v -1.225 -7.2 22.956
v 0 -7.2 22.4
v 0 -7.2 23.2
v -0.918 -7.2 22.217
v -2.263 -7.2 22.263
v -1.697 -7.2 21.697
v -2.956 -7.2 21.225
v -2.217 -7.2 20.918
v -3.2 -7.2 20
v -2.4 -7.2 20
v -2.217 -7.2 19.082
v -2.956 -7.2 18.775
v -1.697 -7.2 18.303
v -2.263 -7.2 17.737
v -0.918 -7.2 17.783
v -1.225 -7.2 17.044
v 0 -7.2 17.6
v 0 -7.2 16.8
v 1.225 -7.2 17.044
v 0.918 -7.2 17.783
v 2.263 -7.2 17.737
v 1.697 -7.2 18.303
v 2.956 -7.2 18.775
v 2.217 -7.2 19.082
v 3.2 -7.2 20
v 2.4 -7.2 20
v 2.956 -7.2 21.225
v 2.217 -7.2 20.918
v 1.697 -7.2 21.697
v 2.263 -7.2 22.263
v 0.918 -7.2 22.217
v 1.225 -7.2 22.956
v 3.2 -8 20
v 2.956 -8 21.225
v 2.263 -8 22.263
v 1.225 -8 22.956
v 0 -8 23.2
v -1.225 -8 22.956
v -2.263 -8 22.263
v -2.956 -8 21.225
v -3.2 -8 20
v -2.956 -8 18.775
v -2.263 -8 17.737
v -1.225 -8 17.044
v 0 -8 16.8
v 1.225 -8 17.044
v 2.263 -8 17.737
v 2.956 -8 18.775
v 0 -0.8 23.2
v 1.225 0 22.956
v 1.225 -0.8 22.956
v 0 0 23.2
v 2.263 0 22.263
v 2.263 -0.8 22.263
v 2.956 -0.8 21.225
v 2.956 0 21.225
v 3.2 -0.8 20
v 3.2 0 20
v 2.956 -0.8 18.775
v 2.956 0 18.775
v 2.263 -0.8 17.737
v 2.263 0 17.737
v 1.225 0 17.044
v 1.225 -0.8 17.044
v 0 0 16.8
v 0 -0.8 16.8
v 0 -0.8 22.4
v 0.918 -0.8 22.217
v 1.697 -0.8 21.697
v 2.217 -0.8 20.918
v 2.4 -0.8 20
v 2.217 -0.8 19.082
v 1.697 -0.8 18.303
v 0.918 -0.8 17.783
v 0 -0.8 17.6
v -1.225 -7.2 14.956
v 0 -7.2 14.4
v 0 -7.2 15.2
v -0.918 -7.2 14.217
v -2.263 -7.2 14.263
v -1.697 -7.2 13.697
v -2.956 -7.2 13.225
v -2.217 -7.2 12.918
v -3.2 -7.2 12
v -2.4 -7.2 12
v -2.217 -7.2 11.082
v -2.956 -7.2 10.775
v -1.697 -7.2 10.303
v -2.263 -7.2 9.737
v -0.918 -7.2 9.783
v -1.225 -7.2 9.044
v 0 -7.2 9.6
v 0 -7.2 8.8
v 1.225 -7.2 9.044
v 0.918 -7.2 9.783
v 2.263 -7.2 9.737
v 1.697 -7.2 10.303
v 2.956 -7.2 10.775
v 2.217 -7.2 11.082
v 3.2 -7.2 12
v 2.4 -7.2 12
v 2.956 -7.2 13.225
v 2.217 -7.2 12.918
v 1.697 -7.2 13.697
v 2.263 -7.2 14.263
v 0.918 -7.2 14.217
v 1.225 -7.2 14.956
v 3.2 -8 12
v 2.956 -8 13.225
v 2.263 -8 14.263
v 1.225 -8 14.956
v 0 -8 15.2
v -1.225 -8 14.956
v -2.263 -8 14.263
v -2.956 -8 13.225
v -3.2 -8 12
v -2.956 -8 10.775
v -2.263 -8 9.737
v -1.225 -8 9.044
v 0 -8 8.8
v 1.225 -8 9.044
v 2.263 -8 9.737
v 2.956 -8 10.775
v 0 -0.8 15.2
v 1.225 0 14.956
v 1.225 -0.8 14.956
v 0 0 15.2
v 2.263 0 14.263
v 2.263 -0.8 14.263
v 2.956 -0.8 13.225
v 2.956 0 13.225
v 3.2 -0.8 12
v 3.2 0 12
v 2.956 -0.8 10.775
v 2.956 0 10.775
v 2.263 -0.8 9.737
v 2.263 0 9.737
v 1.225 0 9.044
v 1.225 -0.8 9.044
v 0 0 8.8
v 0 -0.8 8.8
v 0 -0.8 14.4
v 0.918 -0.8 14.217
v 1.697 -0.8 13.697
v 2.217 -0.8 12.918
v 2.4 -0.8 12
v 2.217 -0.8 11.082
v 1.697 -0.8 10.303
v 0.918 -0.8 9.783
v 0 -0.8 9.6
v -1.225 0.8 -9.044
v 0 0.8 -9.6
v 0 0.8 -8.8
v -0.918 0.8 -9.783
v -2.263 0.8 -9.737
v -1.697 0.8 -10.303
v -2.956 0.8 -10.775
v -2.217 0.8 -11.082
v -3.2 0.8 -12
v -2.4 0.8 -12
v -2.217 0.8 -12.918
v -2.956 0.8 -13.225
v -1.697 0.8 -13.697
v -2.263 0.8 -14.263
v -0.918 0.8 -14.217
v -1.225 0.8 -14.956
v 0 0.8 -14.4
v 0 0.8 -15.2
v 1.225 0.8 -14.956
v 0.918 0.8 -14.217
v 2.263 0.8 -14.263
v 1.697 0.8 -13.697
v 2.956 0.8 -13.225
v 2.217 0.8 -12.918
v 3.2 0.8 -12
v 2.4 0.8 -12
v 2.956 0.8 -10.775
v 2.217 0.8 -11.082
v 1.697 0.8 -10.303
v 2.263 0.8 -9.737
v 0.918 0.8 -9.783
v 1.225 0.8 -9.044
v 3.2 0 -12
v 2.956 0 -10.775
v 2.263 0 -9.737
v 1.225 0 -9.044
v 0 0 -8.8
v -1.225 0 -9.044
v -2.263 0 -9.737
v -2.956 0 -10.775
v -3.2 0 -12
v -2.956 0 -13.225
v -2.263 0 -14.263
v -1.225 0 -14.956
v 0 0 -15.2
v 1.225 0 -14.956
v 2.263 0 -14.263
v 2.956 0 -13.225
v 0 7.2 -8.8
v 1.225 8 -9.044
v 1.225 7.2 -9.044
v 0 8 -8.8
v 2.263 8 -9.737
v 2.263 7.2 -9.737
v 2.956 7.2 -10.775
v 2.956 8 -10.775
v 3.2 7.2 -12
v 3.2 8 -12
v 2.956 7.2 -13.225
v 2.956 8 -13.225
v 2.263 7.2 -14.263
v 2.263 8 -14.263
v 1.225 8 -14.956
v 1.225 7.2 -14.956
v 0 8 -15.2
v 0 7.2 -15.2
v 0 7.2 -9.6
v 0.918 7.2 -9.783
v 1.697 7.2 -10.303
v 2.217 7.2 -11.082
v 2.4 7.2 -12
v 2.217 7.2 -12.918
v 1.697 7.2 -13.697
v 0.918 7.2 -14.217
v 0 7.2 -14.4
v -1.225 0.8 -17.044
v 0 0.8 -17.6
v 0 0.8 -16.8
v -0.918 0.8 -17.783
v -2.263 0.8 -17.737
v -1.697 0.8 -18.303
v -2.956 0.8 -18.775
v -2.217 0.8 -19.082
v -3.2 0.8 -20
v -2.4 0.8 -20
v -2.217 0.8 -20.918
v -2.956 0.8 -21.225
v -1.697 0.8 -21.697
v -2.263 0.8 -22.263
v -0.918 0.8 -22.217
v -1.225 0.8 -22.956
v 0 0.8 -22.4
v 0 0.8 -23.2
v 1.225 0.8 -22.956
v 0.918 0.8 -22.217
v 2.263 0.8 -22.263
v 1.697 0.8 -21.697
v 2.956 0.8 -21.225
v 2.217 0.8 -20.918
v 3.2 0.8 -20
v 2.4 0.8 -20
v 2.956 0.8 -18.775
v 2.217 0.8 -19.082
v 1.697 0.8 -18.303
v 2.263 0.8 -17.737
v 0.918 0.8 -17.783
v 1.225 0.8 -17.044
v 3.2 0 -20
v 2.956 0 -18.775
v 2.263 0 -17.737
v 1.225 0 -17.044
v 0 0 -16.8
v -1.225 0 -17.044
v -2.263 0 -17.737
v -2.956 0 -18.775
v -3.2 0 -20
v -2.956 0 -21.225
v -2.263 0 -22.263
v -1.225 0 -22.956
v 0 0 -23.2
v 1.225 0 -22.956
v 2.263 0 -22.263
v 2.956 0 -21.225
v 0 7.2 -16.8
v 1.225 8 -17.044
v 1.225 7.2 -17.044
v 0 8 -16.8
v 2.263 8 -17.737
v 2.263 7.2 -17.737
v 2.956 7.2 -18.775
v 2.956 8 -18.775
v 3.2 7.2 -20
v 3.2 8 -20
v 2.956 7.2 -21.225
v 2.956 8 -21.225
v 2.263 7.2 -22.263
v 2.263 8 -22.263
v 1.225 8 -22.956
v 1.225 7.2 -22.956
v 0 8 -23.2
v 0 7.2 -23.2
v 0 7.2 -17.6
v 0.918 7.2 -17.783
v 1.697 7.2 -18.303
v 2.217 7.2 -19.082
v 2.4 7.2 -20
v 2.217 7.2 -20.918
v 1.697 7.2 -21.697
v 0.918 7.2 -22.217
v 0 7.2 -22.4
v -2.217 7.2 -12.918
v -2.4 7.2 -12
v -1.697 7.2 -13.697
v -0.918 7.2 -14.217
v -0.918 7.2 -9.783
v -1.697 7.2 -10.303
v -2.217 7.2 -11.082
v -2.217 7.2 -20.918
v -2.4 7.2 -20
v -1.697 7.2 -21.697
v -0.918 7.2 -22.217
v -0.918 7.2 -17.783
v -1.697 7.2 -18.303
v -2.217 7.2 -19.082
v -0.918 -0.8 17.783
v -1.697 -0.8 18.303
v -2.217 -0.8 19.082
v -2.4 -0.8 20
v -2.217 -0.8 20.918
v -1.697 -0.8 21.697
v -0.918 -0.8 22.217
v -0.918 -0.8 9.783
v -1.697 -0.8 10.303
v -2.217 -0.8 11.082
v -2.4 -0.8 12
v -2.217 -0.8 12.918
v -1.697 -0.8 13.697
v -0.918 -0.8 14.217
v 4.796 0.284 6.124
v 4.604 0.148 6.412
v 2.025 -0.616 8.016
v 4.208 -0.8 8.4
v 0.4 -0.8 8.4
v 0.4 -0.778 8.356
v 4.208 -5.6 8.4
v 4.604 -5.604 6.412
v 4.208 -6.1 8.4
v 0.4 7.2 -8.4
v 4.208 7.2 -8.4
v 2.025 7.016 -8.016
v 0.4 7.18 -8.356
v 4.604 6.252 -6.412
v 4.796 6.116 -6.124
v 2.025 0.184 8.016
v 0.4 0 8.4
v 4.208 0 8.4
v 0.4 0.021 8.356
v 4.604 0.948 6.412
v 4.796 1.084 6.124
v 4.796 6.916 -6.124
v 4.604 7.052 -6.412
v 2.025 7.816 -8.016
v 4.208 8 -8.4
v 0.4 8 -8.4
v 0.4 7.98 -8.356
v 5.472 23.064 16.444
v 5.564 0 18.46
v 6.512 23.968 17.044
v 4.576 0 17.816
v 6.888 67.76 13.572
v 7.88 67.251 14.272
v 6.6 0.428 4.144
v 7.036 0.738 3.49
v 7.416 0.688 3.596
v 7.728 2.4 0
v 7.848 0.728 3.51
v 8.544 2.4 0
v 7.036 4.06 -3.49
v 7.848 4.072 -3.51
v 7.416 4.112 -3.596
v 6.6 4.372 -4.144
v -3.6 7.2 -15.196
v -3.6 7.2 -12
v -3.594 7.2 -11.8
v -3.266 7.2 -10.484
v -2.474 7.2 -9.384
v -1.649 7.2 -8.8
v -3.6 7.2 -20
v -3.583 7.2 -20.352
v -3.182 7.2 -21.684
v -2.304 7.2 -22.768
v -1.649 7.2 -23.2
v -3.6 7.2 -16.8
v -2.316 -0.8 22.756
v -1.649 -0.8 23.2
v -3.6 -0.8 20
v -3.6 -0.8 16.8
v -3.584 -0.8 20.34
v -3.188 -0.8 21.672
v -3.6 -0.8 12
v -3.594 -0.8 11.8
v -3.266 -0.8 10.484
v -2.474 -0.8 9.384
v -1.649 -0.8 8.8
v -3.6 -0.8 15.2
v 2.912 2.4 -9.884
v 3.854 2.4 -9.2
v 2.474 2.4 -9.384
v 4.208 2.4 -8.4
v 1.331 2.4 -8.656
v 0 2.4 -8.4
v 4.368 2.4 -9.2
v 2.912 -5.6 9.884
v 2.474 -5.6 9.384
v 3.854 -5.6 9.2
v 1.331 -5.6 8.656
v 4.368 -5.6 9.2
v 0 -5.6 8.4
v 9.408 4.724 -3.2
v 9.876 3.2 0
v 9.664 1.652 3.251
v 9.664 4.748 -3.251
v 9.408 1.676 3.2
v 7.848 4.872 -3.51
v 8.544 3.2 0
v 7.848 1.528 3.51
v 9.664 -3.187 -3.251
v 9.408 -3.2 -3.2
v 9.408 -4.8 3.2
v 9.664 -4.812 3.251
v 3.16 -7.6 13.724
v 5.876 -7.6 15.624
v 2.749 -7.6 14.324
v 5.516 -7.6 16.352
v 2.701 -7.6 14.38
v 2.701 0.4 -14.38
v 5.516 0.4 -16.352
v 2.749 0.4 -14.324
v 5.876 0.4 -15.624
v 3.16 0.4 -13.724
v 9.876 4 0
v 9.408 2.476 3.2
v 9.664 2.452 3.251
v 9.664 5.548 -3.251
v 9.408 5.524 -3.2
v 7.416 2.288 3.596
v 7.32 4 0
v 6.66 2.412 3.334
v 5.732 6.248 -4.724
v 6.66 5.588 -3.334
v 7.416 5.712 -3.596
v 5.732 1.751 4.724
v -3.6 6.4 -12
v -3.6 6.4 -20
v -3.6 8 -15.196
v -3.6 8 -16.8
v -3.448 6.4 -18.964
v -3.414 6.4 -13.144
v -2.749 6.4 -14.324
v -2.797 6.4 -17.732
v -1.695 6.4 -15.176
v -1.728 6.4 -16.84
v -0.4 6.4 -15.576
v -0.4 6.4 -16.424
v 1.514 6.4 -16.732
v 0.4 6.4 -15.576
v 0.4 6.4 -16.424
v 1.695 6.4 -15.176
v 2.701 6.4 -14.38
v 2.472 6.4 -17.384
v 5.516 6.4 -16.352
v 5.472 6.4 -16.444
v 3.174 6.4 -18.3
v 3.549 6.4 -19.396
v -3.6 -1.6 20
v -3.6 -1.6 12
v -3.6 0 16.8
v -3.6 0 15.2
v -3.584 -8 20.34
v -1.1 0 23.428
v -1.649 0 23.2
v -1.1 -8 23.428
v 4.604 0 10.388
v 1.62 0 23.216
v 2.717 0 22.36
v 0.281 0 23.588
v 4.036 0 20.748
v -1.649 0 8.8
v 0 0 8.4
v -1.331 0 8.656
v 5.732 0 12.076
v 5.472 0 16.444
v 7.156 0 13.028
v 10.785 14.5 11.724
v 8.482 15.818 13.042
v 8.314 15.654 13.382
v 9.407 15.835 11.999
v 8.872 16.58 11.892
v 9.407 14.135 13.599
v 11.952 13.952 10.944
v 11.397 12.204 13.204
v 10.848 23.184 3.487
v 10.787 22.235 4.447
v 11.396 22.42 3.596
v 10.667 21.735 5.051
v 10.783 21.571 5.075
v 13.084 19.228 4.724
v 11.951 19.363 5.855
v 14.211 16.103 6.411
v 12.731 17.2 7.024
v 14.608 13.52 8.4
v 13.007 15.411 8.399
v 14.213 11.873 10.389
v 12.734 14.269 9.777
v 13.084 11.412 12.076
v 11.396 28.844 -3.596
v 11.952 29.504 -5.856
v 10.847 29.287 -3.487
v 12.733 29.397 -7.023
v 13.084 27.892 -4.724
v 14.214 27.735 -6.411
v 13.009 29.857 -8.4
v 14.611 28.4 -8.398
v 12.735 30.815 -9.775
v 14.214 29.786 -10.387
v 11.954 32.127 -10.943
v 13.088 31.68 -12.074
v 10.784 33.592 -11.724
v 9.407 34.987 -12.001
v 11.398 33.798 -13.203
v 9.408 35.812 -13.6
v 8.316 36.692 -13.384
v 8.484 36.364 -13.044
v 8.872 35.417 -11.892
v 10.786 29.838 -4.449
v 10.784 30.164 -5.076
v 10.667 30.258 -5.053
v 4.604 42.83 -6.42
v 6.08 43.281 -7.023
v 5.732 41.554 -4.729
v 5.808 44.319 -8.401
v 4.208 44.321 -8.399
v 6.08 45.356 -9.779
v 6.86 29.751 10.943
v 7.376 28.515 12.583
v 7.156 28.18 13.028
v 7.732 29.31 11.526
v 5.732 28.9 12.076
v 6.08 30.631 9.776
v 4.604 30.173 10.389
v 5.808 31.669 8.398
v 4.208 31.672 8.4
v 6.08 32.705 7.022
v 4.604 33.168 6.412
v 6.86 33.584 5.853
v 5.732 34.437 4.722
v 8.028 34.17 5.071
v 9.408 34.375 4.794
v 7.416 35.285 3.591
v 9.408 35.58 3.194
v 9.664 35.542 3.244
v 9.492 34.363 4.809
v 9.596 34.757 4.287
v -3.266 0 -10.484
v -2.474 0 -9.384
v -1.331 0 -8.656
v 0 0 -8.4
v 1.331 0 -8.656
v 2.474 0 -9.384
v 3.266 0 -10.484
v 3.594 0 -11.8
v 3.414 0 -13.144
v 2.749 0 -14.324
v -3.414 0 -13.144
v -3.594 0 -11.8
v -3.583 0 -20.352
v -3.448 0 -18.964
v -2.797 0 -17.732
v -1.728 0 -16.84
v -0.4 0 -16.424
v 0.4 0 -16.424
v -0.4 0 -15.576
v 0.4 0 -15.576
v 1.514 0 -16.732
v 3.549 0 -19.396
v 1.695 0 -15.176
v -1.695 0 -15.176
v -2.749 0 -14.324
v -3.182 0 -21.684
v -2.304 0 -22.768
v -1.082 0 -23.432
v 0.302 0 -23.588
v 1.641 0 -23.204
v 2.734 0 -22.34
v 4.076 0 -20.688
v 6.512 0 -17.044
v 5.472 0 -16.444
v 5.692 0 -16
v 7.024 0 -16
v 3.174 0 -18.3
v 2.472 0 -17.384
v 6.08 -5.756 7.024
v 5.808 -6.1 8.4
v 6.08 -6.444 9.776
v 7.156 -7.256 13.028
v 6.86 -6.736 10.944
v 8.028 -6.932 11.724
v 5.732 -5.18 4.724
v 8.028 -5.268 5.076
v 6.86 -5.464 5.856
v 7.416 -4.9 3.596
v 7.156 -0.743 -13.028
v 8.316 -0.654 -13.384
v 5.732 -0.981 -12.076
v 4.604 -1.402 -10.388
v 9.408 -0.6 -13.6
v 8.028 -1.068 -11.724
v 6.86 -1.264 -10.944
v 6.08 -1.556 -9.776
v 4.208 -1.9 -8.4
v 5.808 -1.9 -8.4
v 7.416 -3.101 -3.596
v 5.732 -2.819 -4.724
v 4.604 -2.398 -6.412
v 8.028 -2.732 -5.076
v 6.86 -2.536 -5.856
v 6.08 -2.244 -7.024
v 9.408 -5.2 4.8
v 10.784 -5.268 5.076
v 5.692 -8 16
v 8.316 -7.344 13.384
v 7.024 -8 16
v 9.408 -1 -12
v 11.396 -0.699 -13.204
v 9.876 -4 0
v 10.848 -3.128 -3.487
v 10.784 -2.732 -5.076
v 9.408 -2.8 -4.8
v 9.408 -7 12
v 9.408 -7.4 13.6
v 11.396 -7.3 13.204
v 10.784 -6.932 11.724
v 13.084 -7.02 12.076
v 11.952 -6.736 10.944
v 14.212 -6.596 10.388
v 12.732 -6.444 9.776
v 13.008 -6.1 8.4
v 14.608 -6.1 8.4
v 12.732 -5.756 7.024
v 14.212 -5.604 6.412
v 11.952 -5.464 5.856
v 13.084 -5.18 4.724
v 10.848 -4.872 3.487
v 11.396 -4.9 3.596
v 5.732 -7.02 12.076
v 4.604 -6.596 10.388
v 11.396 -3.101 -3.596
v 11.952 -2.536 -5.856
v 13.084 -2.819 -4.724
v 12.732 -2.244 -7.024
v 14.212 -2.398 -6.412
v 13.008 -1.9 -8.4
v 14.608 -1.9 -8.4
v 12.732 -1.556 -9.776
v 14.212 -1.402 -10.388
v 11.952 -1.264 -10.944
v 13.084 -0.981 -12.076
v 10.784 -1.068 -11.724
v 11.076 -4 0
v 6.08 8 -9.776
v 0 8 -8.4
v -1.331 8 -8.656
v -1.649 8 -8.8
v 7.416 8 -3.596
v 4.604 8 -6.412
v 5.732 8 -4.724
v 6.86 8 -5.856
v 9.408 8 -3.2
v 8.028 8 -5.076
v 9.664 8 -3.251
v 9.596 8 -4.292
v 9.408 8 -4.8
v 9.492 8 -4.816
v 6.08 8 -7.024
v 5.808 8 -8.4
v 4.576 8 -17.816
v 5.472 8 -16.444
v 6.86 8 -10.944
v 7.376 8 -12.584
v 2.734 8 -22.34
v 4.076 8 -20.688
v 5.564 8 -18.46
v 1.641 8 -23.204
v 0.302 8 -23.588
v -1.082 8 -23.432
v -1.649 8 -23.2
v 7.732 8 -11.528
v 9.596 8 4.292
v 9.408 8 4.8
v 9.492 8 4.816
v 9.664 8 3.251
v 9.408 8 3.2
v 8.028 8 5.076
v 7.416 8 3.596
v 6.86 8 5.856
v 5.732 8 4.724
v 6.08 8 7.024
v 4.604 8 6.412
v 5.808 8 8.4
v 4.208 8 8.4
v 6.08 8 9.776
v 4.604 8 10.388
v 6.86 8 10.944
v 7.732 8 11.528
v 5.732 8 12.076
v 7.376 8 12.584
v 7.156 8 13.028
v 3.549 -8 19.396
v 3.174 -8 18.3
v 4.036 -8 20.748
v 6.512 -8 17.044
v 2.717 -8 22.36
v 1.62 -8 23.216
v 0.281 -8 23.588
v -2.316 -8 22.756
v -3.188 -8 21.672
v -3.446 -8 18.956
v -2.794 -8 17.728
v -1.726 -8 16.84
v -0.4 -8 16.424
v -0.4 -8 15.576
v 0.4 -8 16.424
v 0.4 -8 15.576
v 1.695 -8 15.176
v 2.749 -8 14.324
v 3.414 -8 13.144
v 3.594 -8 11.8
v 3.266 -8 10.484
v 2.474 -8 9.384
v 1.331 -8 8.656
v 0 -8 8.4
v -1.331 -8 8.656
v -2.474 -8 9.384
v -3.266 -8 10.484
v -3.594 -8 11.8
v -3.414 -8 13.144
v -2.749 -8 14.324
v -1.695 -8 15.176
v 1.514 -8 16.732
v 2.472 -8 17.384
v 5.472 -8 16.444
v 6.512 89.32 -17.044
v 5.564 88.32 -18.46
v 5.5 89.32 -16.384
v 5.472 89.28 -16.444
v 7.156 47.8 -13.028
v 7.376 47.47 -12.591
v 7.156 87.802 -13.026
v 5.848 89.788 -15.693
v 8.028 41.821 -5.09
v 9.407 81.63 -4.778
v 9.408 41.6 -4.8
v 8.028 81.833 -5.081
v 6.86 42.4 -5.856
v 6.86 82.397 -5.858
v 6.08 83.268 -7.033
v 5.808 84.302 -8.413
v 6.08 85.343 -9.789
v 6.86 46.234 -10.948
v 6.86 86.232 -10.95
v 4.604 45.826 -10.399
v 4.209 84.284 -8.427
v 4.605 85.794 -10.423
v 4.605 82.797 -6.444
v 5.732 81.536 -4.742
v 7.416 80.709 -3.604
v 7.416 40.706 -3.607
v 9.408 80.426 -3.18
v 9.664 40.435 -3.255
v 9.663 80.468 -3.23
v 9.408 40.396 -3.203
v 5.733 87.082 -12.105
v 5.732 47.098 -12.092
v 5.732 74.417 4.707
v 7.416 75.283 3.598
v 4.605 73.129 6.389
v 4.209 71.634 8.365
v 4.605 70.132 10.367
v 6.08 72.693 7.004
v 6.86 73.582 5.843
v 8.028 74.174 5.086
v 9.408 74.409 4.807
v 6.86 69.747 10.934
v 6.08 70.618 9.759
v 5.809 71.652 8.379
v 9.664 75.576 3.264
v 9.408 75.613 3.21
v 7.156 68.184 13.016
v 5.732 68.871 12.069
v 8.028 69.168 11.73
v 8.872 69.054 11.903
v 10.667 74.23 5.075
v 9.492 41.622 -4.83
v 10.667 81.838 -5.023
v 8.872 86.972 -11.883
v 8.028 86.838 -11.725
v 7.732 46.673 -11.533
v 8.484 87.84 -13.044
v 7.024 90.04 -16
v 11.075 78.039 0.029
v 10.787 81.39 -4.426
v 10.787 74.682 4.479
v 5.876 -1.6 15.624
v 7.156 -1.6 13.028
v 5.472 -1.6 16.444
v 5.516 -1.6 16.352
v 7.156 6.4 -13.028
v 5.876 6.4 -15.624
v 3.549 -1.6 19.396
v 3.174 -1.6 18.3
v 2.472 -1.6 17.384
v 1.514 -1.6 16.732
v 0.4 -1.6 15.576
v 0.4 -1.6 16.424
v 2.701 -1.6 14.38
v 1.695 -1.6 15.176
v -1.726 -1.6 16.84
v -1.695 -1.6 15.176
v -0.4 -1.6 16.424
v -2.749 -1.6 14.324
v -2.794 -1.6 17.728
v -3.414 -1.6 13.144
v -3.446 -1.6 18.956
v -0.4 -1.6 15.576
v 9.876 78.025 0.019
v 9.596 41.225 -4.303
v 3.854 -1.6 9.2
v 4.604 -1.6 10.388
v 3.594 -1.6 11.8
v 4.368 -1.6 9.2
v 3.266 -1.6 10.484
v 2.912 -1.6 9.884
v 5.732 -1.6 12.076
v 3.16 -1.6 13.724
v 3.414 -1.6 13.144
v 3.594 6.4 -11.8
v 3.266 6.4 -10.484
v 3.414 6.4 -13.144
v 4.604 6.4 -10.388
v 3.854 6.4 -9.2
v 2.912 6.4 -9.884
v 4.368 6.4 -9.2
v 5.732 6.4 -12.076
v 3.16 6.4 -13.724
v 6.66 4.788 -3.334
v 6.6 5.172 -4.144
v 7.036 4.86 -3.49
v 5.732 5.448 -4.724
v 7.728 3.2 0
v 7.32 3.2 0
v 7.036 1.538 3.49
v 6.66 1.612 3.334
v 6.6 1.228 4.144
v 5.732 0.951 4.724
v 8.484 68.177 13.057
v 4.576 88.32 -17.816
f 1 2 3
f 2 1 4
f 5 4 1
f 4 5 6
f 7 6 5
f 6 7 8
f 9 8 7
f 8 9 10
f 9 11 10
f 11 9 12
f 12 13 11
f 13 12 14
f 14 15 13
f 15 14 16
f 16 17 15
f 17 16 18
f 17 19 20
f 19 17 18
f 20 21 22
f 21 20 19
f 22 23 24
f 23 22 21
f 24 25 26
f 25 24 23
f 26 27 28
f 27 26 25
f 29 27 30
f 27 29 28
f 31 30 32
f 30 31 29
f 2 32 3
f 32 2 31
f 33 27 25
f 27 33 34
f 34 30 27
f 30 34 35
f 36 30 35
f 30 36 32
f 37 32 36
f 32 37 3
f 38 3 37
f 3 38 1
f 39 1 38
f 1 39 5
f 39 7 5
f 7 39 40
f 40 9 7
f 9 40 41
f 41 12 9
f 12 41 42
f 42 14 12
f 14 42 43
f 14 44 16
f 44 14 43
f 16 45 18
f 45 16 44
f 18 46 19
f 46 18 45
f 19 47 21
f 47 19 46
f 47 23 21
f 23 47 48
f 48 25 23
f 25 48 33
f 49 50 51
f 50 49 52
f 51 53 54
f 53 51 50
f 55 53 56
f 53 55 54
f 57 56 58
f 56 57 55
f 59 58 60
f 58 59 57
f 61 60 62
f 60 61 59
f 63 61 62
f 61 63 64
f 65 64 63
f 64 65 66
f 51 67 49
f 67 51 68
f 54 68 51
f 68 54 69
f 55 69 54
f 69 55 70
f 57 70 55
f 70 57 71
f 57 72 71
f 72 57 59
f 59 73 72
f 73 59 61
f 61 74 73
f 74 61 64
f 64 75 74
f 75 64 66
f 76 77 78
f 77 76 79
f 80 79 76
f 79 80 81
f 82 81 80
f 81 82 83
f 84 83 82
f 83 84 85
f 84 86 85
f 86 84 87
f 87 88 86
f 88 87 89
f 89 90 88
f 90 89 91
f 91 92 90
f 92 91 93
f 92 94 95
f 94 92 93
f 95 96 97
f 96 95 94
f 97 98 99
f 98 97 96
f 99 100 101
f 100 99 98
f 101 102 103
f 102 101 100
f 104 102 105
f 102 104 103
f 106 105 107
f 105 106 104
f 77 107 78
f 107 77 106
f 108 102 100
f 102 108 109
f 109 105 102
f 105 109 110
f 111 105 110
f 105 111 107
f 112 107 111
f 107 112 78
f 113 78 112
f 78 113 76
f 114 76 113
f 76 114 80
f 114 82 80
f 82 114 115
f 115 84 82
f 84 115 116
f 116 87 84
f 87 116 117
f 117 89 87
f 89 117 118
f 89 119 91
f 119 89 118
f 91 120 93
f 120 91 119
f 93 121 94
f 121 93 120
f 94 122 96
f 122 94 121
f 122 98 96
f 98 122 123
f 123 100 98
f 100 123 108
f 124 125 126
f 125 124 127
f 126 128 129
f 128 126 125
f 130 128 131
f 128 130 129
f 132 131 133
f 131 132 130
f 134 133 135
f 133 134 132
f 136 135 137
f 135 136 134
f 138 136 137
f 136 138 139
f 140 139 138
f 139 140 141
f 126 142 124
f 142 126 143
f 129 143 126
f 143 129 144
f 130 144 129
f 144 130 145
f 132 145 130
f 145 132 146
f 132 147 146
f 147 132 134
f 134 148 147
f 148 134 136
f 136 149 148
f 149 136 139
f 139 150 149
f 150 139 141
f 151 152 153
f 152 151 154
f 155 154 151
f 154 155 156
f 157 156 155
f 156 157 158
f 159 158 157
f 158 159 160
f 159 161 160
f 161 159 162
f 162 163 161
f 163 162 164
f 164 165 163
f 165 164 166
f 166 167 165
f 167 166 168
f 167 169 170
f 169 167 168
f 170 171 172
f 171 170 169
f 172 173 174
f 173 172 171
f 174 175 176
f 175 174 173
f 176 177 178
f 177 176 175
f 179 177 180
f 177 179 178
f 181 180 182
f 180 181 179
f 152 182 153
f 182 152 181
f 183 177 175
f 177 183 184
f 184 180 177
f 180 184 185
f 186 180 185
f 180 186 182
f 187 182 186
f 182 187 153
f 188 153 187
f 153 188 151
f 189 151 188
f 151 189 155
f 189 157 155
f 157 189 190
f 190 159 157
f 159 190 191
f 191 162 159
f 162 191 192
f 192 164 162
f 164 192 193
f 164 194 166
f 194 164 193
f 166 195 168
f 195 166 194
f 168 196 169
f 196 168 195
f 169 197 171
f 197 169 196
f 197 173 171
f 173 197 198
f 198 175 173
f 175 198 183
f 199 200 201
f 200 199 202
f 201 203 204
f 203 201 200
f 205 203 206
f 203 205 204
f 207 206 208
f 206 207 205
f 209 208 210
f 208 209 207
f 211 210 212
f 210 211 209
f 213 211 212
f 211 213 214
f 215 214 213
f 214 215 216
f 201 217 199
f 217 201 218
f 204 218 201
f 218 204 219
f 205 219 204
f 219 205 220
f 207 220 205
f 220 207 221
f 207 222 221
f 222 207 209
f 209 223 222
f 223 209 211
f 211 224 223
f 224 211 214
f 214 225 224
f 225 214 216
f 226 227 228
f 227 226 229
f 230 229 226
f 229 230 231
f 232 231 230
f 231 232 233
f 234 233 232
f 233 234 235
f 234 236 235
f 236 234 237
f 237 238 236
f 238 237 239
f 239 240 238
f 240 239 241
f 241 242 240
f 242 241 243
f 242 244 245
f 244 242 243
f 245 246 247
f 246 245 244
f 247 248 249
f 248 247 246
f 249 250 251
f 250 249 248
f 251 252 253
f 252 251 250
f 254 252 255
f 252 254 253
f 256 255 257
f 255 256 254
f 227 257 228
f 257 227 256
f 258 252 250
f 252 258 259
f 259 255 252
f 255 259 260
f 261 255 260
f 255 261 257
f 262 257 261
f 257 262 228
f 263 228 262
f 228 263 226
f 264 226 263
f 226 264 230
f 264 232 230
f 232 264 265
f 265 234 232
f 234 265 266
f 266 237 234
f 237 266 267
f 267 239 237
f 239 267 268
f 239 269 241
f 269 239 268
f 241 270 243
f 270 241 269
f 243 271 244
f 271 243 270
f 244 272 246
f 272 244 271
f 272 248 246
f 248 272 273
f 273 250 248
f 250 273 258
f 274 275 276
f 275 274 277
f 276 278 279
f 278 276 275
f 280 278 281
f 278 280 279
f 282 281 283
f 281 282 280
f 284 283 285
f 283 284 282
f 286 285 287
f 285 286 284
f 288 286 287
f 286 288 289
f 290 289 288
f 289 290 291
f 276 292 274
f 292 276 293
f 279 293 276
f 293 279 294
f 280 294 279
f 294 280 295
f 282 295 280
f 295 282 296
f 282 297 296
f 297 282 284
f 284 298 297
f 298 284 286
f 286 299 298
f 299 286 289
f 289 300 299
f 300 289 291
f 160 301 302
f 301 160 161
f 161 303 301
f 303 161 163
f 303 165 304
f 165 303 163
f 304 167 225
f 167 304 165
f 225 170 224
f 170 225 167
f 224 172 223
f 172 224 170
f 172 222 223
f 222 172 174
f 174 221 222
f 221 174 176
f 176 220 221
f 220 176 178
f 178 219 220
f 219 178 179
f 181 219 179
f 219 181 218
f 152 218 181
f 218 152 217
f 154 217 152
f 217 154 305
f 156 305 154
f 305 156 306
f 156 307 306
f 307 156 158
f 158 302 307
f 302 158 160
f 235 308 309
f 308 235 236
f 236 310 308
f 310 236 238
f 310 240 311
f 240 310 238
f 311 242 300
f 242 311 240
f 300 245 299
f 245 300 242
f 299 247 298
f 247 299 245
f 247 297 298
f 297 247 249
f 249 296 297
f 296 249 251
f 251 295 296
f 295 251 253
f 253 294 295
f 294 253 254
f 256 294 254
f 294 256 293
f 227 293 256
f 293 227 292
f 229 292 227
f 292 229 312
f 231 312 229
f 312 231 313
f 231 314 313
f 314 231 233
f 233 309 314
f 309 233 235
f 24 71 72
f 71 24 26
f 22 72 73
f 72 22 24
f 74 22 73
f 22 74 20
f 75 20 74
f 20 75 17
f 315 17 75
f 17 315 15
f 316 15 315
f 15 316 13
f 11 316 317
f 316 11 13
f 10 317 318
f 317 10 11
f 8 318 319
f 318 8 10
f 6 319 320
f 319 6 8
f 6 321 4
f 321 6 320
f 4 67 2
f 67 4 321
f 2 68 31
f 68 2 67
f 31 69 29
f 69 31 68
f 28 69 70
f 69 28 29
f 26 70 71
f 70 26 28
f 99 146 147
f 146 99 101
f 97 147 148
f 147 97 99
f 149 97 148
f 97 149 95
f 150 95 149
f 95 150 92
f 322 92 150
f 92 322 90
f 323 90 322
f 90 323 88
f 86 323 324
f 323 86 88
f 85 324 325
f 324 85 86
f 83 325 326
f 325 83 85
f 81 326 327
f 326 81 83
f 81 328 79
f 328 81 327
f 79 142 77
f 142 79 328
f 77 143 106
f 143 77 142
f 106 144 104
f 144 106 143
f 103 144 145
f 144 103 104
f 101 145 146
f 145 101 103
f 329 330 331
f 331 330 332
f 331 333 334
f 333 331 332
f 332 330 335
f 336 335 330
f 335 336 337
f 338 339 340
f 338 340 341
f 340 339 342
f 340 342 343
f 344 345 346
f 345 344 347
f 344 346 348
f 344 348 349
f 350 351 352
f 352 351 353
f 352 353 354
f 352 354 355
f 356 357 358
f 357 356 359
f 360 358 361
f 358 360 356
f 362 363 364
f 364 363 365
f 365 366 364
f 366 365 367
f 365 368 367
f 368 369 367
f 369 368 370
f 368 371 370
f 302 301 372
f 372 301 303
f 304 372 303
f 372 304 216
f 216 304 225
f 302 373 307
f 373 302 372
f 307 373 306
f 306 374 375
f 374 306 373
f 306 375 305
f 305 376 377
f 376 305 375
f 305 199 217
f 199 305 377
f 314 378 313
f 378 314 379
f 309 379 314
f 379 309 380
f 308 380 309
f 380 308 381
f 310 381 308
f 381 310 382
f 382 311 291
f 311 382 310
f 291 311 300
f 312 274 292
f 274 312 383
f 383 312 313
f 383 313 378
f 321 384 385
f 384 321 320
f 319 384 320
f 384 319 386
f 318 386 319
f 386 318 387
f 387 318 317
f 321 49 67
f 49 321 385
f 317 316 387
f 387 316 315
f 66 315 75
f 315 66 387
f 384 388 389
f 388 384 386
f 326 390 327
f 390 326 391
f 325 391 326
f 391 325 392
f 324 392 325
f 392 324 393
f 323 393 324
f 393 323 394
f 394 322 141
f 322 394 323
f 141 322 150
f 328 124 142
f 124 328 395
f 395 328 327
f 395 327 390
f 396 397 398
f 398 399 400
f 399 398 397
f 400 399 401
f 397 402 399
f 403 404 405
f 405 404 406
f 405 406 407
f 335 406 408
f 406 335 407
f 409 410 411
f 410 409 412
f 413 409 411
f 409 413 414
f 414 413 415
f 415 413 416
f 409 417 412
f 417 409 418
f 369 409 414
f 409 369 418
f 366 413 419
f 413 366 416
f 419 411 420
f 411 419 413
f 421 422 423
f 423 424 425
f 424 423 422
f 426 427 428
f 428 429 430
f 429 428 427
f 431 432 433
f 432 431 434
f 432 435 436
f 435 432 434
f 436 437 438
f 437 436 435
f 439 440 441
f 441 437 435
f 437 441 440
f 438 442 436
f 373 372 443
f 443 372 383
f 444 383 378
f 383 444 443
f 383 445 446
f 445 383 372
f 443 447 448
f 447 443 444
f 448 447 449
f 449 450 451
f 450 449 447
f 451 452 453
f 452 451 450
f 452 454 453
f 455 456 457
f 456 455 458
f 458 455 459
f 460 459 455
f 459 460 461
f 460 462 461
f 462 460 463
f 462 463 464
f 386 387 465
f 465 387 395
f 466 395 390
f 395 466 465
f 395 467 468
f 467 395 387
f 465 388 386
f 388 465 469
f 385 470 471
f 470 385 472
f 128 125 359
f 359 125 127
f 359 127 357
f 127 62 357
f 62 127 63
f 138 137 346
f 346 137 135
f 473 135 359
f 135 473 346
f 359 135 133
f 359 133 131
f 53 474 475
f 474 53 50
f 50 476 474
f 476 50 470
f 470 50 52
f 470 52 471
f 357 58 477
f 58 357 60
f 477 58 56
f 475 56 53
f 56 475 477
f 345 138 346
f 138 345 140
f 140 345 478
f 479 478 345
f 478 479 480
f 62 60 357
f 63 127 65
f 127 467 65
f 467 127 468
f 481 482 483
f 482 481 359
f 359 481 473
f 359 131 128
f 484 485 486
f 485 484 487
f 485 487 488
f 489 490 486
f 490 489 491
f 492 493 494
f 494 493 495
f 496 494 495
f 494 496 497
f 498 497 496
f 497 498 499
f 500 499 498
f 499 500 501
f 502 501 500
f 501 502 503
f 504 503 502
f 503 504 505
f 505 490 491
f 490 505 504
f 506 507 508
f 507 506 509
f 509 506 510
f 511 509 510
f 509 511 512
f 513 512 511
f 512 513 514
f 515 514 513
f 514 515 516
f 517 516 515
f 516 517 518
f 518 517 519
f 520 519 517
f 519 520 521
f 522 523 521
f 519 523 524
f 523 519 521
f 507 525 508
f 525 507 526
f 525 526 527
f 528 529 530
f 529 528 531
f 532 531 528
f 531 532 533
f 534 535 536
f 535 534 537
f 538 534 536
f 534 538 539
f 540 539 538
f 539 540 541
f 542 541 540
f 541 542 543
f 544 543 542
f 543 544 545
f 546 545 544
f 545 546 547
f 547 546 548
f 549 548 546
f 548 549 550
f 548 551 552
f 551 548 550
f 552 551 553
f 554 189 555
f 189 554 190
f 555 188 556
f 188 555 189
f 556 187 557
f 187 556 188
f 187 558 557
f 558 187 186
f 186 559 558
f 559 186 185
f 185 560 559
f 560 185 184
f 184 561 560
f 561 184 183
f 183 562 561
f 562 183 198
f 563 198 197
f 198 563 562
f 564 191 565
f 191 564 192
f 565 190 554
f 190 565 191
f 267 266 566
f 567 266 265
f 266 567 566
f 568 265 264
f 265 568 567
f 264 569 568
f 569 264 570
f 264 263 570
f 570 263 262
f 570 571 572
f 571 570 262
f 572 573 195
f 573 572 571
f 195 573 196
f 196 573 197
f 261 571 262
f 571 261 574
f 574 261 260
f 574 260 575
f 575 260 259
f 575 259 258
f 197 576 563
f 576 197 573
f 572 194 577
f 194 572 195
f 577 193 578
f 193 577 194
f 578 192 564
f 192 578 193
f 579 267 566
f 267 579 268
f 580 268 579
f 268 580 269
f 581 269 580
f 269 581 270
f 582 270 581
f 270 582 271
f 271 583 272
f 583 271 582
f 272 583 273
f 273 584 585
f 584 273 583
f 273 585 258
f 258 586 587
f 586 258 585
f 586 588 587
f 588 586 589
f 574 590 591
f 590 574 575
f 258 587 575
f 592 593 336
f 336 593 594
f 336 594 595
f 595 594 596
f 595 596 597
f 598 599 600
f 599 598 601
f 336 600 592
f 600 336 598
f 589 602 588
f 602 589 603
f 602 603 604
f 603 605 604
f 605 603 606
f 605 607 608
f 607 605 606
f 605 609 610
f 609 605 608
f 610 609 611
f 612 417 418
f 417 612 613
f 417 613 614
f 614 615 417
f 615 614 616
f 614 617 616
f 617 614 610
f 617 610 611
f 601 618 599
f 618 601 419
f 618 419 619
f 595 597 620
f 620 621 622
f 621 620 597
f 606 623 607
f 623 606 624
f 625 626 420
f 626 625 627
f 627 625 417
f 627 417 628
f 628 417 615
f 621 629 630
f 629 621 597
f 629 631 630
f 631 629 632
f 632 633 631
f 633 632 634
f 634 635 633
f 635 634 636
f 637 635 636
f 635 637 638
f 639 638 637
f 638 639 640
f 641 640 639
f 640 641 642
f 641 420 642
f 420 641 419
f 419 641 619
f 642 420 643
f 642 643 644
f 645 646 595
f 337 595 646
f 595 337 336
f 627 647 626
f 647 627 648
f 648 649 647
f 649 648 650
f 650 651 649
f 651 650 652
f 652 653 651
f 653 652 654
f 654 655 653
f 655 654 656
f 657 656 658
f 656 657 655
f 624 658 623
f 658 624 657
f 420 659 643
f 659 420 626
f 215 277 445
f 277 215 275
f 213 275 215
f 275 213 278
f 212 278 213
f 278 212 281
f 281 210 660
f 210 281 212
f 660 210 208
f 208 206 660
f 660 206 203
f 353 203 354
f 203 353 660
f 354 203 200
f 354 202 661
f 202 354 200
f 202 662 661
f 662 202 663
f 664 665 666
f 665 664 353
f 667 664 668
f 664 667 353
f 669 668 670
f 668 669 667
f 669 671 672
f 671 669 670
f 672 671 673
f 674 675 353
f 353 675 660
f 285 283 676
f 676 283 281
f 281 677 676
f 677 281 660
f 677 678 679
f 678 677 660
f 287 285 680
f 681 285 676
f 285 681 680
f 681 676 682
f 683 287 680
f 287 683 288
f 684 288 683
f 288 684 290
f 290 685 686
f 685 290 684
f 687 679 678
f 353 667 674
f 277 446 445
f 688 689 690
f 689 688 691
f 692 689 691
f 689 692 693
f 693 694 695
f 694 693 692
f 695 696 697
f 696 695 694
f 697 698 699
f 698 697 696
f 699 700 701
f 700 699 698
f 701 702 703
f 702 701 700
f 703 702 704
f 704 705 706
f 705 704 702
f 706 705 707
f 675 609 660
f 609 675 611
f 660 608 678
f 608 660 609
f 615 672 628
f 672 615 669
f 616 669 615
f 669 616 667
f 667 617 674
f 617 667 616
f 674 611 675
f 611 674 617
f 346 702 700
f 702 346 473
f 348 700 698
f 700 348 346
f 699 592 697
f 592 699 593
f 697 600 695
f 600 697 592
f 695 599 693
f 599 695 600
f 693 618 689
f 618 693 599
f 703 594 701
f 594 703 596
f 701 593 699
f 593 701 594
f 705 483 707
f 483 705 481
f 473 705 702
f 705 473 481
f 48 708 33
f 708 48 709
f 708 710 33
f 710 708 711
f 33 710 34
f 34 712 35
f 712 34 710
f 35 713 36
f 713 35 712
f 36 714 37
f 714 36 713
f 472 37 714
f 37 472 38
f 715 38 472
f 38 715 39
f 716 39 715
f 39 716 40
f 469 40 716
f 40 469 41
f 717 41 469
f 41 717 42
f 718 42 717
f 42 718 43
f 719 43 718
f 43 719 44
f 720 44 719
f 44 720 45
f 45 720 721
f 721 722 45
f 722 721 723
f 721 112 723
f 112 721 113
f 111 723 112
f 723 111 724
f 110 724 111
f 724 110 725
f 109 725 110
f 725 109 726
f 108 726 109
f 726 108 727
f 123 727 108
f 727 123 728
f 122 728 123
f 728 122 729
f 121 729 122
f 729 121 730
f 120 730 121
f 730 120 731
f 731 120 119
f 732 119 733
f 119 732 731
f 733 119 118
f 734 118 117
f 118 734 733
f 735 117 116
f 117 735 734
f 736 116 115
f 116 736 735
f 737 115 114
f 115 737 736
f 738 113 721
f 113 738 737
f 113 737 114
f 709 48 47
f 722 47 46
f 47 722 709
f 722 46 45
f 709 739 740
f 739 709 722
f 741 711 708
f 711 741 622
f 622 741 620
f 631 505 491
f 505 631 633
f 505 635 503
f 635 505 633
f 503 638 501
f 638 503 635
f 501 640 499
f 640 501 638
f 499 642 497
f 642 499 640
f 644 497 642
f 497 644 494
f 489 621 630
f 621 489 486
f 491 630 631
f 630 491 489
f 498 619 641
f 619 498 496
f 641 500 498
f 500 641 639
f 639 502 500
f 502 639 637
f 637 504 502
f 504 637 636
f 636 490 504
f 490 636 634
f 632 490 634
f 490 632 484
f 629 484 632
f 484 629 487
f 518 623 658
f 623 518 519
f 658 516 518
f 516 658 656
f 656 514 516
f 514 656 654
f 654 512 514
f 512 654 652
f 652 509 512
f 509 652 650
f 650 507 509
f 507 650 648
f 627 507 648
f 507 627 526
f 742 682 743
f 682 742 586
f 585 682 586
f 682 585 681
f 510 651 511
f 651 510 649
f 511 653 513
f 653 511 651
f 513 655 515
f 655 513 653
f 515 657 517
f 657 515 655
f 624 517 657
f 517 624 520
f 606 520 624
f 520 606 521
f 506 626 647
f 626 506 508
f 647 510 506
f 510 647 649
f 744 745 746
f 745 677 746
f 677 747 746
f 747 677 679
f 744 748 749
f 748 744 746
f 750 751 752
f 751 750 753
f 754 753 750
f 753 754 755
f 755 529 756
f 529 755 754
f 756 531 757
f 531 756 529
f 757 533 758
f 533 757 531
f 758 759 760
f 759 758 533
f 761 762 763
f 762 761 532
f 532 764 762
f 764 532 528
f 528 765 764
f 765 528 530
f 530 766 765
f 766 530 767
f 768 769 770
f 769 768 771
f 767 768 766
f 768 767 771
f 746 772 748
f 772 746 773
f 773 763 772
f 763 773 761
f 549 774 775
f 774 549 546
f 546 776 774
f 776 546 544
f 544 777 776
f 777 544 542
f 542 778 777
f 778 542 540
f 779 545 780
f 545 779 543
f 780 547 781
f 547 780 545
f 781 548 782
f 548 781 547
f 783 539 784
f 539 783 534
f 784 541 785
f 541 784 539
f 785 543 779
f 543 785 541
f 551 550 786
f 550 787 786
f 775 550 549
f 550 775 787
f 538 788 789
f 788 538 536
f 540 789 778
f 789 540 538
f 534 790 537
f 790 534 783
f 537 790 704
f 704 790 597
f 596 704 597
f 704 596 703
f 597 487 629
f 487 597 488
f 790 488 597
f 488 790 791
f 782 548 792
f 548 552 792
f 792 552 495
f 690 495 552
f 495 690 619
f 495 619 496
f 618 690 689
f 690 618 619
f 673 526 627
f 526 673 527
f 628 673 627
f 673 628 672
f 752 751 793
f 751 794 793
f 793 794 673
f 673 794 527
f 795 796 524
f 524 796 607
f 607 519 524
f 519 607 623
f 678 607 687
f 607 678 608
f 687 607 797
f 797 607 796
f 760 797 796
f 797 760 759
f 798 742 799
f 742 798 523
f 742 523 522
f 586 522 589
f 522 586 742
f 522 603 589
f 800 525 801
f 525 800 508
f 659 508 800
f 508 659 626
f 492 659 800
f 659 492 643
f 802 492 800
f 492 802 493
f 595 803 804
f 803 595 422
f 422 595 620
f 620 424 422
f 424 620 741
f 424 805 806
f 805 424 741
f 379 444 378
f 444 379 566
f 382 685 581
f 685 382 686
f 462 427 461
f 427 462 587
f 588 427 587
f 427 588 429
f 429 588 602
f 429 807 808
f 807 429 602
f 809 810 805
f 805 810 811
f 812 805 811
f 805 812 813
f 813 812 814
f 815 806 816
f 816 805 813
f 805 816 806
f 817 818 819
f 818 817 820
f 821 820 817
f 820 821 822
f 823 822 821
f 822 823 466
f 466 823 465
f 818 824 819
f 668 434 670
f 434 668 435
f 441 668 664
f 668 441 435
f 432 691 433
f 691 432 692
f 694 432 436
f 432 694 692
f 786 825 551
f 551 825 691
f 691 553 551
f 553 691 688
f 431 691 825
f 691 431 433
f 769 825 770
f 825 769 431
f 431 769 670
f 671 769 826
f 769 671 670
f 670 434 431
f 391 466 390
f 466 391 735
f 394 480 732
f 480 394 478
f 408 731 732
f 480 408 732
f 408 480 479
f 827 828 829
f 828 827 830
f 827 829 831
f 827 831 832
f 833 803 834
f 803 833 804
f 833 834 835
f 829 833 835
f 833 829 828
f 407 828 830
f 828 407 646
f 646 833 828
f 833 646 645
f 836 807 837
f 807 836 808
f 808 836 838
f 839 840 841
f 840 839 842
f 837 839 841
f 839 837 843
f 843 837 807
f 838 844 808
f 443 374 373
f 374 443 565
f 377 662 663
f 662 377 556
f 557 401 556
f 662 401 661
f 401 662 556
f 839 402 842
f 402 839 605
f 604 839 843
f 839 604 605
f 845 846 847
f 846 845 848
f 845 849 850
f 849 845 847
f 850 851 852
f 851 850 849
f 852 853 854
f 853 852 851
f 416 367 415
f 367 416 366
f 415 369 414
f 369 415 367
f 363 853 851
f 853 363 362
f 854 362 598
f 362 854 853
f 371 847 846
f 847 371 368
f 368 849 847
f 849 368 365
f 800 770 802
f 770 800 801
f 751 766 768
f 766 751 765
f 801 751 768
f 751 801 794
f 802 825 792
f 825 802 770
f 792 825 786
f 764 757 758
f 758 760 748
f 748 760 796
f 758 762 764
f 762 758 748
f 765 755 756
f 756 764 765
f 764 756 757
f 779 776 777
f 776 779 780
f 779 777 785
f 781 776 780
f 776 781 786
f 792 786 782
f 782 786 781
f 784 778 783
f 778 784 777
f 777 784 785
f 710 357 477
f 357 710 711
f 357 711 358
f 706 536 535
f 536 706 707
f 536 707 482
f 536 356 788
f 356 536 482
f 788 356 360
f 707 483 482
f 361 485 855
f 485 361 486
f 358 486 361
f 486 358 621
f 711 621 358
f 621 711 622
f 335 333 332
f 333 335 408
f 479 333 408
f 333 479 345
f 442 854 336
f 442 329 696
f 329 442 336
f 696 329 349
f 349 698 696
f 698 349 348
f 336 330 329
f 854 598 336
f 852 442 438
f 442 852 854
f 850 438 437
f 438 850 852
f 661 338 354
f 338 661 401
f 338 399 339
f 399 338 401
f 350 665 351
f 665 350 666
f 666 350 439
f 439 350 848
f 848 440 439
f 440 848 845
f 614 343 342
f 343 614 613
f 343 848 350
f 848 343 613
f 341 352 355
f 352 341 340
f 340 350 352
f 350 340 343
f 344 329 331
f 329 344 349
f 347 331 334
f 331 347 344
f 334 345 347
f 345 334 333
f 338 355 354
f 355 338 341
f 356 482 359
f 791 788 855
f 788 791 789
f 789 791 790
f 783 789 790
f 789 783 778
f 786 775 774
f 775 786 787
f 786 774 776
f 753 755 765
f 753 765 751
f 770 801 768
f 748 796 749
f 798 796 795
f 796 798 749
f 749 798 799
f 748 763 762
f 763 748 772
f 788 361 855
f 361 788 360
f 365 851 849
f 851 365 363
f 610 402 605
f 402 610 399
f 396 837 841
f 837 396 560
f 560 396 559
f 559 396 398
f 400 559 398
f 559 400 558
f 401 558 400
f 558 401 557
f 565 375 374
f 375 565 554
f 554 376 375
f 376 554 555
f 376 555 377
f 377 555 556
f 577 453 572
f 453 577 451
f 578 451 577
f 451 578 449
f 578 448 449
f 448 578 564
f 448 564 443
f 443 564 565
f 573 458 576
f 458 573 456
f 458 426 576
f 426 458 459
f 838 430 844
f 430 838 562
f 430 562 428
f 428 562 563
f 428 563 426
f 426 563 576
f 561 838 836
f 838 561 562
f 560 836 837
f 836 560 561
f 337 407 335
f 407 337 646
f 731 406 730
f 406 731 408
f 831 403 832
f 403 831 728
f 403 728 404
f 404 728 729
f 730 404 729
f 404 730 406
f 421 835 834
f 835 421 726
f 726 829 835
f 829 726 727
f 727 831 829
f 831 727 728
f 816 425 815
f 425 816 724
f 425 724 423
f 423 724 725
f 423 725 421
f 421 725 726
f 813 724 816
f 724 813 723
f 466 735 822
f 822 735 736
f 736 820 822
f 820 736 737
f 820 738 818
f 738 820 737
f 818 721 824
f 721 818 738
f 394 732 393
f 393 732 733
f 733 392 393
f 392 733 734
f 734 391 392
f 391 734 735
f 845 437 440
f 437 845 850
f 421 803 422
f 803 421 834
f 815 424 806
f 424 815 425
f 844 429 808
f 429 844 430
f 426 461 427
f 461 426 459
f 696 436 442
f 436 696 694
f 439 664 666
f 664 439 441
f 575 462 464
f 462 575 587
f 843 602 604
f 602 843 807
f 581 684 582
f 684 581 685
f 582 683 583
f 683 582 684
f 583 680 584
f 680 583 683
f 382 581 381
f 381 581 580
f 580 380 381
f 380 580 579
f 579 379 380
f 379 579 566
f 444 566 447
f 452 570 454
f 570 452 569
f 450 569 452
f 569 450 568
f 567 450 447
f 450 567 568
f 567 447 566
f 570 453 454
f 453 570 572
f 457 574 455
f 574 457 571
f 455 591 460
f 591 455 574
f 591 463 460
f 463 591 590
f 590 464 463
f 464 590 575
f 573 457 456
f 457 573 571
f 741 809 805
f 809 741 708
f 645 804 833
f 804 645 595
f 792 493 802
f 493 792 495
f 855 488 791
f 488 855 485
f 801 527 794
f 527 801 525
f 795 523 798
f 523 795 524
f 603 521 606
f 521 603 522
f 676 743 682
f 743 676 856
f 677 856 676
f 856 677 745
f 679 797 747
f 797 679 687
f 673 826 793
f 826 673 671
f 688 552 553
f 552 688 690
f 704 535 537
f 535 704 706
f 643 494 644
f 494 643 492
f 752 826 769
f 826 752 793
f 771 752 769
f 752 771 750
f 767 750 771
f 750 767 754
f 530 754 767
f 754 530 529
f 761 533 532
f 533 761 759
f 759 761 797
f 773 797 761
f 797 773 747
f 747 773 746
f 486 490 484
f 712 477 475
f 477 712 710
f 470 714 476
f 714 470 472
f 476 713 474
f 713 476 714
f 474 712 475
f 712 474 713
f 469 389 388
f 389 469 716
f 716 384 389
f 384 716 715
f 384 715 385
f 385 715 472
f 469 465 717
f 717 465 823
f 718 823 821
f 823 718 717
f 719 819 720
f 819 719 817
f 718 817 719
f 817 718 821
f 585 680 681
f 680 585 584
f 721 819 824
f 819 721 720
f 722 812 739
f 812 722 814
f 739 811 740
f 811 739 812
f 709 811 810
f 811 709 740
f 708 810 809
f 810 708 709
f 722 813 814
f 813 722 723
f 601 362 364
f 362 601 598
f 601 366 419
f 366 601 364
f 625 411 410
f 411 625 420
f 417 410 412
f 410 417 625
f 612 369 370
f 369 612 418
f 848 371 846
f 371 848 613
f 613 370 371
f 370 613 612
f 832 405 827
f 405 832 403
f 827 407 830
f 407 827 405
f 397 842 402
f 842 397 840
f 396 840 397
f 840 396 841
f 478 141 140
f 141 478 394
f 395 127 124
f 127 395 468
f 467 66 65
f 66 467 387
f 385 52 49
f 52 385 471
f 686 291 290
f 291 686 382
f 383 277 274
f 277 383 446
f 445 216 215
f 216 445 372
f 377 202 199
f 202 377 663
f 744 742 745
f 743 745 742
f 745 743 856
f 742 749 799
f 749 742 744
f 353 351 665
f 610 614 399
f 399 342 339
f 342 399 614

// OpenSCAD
use <../lib.scad>
use <32189.scad>
function ldraw_lib__22973() = [
// 0 =Technic Panel Fairing #4
// 0 Name: 22973.dat
// 0 Author: Steve Bliss [sbliss]
// 0 !LDRAW_ORG Part Alias UPDATE 2013-02
// 0 !LICENSE Licensed under CC BY 4.0 : see CAreadme.txt
// 
// 0 BFC CERTIFY CCW
  [0,"BFC","CERTIFY"],
  [0,"BFC","CCW"],
// 
// 0 !HISTORY 2002-06-11 [PTadmin] Official Update 2002-03
// 0 !HISTORY 2007-10-12 [PTadmin] Header formatted for Contributor Agreement
// 0 !HISTORY 2008-07-01 [PTadmin] Official Update 2008-01
// 0 !HISTORY 2013-12-14 [cwdee] Add = prefix
// 0 !HISTORY 2013-12-23 [PTadmin] Official Update 2013-02
// 
// 
// 0 // Alias of 32189
// 1 16 0 0 0 1 0 0 0 1 0 0 0 1 32189.dat
  [1,16,0,0,0,1,0,0,0,1,0,0,0,1, ldraw_lib__32189()],
];
module ldraw_lib__22973(step=0, col=false, unit=2/5, alt=false, line=0.2, solid=!$preview)
    makepoly(ldraw_lib__22973(), step=step, col=col, unit=unit, alt=alt, line=line, solid=solid);
ldraw_lib__22973(line=0.2);
